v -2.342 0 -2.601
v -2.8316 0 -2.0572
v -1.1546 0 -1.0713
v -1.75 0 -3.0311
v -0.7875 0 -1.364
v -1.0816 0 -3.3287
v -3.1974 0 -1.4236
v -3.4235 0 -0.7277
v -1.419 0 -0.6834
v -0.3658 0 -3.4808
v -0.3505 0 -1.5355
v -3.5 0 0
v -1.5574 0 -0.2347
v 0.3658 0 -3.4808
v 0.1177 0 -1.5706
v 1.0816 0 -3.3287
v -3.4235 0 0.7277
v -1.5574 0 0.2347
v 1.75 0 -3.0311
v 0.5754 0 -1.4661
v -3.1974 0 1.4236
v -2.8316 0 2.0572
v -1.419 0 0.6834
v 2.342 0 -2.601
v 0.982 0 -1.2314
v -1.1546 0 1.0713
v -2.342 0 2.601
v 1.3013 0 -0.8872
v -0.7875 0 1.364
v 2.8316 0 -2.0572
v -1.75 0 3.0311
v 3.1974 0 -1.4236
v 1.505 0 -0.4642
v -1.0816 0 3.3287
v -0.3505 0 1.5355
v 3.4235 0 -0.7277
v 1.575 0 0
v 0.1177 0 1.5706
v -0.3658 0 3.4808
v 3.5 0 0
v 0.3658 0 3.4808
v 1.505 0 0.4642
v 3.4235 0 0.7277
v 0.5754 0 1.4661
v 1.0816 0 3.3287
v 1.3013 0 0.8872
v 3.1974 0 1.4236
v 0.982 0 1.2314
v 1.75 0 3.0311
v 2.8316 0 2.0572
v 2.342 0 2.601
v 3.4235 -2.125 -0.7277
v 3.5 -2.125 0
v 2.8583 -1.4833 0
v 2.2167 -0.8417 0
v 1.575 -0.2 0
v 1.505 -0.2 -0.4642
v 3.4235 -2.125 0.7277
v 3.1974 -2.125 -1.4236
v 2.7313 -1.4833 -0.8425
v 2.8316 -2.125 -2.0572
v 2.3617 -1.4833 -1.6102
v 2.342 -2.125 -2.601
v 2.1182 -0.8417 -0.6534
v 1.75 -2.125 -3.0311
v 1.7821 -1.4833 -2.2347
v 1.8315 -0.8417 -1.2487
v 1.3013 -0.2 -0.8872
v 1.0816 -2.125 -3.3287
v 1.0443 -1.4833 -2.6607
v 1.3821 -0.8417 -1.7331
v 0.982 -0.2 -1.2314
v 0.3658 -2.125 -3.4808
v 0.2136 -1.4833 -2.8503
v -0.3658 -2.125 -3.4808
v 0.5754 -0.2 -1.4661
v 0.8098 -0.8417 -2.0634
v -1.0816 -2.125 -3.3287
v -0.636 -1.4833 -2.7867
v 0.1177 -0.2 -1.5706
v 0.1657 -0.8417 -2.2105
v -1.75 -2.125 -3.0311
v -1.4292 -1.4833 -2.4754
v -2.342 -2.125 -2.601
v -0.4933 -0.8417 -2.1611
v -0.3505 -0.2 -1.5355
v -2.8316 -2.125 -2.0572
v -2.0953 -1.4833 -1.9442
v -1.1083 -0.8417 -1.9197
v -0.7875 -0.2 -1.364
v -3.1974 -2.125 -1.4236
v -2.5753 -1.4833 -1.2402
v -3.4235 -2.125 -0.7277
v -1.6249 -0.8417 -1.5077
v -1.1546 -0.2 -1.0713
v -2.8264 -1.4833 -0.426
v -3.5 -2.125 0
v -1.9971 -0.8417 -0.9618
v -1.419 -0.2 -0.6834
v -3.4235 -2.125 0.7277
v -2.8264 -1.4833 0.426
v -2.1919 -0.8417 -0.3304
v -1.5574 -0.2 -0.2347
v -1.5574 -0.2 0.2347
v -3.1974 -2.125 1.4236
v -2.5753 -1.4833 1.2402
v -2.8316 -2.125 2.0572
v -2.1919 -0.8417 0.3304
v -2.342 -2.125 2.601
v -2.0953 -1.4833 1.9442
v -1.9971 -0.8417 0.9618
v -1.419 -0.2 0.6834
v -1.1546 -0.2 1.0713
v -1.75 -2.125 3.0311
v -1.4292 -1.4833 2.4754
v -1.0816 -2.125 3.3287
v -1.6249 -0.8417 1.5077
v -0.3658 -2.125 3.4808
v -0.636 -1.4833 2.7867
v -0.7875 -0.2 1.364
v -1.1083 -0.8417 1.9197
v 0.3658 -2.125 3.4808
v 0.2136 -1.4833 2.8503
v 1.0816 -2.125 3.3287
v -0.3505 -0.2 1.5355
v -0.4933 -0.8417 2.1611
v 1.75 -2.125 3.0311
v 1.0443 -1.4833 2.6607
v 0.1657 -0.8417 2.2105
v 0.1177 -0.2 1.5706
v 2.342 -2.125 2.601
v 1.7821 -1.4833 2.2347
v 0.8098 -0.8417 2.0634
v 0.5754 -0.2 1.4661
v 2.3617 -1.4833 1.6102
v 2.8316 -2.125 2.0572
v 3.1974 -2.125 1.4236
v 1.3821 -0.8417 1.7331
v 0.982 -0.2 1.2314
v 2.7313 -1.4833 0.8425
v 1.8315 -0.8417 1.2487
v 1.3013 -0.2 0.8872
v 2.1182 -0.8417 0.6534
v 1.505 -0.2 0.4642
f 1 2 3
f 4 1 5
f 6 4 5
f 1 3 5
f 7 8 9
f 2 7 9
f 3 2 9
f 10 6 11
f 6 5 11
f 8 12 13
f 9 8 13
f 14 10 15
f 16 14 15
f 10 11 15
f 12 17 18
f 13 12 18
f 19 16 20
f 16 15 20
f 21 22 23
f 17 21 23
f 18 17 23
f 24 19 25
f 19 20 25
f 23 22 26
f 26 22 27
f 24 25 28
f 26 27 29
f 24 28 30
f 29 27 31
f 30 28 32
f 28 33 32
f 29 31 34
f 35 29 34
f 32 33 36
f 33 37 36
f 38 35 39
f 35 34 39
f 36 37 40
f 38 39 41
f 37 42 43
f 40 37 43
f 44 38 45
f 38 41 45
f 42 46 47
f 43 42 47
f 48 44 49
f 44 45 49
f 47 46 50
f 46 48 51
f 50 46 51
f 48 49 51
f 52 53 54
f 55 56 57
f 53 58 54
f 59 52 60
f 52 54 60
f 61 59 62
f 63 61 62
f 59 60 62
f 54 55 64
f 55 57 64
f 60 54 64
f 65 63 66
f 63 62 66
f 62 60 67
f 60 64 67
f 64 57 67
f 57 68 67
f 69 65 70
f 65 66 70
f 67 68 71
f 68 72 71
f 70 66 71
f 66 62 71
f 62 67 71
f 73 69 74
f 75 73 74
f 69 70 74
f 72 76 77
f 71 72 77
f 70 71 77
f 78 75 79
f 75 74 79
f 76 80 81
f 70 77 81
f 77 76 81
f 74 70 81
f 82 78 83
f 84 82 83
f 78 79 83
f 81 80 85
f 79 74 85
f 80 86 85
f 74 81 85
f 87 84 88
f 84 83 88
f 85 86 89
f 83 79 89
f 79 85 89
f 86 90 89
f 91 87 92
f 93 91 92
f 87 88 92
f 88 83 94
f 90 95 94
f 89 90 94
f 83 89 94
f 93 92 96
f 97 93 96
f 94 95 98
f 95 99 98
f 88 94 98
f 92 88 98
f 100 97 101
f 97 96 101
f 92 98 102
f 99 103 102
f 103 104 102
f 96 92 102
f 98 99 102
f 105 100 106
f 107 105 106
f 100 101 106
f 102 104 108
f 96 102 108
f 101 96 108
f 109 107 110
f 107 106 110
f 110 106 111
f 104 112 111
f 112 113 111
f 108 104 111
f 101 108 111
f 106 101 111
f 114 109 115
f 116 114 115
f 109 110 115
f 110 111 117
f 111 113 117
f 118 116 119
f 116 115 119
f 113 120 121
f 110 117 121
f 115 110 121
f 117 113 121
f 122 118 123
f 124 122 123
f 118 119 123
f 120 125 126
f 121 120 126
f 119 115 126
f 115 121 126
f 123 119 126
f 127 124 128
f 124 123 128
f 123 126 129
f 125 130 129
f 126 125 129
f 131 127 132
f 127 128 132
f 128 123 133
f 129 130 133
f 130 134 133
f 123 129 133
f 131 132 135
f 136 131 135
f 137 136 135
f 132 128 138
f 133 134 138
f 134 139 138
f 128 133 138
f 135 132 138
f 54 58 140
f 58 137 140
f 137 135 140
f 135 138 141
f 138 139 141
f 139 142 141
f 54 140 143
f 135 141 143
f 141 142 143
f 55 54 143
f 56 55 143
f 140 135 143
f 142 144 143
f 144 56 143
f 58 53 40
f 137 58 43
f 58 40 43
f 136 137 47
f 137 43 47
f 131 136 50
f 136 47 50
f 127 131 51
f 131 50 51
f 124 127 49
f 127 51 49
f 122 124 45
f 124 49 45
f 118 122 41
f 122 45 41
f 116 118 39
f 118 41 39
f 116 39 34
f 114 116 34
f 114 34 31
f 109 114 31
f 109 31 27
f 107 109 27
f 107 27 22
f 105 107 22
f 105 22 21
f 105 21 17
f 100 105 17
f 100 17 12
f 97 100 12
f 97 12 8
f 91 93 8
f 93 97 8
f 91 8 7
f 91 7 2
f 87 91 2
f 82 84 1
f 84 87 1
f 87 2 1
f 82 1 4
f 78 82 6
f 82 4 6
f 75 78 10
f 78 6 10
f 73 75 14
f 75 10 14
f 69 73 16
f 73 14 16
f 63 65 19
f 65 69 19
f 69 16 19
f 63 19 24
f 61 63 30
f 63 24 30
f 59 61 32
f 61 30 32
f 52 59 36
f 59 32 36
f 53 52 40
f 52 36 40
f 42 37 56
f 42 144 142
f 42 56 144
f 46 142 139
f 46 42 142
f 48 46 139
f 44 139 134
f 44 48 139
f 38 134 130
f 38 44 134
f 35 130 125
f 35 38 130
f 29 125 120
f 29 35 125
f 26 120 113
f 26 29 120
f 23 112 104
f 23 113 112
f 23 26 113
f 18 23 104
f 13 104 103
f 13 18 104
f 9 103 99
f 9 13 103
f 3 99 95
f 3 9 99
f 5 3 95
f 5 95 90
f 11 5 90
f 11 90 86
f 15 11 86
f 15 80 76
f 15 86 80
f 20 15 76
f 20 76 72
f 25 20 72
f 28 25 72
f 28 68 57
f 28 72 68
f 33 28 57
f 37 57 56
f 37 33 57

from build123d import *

# Parameters (mm, degrees)
F0_R     = 3.5
F0_R_2   = 1.575
F1_DEPTH = 2.2
F2_DEPTH = 4


# Not quite as in the source:
# - a fillet or chamfer that OpenCascade refuses, or shapes differently, is made with other operations: its cross-section is extruded or revolved along the edge and cut away or added


with BuildPart() as f1:
    # F0 (on Front) → F1 (new body)
    with BuildSketch(Plane.XZ):
        Circle(F0_R)
        Circle(F0_R_2, mode=Mode.SUBTRACT)
        Circle(F0_R_2)
    extrude(amount=F1_DEPTH)

    # F0 (on Front) → F2 (cut)
    with BuildSketch(Plane.XZ):
        Circle(F0_R_2)
    extrude(amount=F2_DEPTH, mode=Mode.SUBTRACT)

    # F3: chamfer of 2 on 1 edges, made by hand

    # F3_s1 → F3_t2 (revolve, cut)
    with BuildSketch(Plane.XY):
        Polygon((3.575, -2.2), (1.575, -0.2), (1.575, -2.2), align=None)
    revolve(axis=Axis((0, -2.2, 0), (0, 1, 0)), mode=Mode.SUBTRACT)


solid = f1.part
